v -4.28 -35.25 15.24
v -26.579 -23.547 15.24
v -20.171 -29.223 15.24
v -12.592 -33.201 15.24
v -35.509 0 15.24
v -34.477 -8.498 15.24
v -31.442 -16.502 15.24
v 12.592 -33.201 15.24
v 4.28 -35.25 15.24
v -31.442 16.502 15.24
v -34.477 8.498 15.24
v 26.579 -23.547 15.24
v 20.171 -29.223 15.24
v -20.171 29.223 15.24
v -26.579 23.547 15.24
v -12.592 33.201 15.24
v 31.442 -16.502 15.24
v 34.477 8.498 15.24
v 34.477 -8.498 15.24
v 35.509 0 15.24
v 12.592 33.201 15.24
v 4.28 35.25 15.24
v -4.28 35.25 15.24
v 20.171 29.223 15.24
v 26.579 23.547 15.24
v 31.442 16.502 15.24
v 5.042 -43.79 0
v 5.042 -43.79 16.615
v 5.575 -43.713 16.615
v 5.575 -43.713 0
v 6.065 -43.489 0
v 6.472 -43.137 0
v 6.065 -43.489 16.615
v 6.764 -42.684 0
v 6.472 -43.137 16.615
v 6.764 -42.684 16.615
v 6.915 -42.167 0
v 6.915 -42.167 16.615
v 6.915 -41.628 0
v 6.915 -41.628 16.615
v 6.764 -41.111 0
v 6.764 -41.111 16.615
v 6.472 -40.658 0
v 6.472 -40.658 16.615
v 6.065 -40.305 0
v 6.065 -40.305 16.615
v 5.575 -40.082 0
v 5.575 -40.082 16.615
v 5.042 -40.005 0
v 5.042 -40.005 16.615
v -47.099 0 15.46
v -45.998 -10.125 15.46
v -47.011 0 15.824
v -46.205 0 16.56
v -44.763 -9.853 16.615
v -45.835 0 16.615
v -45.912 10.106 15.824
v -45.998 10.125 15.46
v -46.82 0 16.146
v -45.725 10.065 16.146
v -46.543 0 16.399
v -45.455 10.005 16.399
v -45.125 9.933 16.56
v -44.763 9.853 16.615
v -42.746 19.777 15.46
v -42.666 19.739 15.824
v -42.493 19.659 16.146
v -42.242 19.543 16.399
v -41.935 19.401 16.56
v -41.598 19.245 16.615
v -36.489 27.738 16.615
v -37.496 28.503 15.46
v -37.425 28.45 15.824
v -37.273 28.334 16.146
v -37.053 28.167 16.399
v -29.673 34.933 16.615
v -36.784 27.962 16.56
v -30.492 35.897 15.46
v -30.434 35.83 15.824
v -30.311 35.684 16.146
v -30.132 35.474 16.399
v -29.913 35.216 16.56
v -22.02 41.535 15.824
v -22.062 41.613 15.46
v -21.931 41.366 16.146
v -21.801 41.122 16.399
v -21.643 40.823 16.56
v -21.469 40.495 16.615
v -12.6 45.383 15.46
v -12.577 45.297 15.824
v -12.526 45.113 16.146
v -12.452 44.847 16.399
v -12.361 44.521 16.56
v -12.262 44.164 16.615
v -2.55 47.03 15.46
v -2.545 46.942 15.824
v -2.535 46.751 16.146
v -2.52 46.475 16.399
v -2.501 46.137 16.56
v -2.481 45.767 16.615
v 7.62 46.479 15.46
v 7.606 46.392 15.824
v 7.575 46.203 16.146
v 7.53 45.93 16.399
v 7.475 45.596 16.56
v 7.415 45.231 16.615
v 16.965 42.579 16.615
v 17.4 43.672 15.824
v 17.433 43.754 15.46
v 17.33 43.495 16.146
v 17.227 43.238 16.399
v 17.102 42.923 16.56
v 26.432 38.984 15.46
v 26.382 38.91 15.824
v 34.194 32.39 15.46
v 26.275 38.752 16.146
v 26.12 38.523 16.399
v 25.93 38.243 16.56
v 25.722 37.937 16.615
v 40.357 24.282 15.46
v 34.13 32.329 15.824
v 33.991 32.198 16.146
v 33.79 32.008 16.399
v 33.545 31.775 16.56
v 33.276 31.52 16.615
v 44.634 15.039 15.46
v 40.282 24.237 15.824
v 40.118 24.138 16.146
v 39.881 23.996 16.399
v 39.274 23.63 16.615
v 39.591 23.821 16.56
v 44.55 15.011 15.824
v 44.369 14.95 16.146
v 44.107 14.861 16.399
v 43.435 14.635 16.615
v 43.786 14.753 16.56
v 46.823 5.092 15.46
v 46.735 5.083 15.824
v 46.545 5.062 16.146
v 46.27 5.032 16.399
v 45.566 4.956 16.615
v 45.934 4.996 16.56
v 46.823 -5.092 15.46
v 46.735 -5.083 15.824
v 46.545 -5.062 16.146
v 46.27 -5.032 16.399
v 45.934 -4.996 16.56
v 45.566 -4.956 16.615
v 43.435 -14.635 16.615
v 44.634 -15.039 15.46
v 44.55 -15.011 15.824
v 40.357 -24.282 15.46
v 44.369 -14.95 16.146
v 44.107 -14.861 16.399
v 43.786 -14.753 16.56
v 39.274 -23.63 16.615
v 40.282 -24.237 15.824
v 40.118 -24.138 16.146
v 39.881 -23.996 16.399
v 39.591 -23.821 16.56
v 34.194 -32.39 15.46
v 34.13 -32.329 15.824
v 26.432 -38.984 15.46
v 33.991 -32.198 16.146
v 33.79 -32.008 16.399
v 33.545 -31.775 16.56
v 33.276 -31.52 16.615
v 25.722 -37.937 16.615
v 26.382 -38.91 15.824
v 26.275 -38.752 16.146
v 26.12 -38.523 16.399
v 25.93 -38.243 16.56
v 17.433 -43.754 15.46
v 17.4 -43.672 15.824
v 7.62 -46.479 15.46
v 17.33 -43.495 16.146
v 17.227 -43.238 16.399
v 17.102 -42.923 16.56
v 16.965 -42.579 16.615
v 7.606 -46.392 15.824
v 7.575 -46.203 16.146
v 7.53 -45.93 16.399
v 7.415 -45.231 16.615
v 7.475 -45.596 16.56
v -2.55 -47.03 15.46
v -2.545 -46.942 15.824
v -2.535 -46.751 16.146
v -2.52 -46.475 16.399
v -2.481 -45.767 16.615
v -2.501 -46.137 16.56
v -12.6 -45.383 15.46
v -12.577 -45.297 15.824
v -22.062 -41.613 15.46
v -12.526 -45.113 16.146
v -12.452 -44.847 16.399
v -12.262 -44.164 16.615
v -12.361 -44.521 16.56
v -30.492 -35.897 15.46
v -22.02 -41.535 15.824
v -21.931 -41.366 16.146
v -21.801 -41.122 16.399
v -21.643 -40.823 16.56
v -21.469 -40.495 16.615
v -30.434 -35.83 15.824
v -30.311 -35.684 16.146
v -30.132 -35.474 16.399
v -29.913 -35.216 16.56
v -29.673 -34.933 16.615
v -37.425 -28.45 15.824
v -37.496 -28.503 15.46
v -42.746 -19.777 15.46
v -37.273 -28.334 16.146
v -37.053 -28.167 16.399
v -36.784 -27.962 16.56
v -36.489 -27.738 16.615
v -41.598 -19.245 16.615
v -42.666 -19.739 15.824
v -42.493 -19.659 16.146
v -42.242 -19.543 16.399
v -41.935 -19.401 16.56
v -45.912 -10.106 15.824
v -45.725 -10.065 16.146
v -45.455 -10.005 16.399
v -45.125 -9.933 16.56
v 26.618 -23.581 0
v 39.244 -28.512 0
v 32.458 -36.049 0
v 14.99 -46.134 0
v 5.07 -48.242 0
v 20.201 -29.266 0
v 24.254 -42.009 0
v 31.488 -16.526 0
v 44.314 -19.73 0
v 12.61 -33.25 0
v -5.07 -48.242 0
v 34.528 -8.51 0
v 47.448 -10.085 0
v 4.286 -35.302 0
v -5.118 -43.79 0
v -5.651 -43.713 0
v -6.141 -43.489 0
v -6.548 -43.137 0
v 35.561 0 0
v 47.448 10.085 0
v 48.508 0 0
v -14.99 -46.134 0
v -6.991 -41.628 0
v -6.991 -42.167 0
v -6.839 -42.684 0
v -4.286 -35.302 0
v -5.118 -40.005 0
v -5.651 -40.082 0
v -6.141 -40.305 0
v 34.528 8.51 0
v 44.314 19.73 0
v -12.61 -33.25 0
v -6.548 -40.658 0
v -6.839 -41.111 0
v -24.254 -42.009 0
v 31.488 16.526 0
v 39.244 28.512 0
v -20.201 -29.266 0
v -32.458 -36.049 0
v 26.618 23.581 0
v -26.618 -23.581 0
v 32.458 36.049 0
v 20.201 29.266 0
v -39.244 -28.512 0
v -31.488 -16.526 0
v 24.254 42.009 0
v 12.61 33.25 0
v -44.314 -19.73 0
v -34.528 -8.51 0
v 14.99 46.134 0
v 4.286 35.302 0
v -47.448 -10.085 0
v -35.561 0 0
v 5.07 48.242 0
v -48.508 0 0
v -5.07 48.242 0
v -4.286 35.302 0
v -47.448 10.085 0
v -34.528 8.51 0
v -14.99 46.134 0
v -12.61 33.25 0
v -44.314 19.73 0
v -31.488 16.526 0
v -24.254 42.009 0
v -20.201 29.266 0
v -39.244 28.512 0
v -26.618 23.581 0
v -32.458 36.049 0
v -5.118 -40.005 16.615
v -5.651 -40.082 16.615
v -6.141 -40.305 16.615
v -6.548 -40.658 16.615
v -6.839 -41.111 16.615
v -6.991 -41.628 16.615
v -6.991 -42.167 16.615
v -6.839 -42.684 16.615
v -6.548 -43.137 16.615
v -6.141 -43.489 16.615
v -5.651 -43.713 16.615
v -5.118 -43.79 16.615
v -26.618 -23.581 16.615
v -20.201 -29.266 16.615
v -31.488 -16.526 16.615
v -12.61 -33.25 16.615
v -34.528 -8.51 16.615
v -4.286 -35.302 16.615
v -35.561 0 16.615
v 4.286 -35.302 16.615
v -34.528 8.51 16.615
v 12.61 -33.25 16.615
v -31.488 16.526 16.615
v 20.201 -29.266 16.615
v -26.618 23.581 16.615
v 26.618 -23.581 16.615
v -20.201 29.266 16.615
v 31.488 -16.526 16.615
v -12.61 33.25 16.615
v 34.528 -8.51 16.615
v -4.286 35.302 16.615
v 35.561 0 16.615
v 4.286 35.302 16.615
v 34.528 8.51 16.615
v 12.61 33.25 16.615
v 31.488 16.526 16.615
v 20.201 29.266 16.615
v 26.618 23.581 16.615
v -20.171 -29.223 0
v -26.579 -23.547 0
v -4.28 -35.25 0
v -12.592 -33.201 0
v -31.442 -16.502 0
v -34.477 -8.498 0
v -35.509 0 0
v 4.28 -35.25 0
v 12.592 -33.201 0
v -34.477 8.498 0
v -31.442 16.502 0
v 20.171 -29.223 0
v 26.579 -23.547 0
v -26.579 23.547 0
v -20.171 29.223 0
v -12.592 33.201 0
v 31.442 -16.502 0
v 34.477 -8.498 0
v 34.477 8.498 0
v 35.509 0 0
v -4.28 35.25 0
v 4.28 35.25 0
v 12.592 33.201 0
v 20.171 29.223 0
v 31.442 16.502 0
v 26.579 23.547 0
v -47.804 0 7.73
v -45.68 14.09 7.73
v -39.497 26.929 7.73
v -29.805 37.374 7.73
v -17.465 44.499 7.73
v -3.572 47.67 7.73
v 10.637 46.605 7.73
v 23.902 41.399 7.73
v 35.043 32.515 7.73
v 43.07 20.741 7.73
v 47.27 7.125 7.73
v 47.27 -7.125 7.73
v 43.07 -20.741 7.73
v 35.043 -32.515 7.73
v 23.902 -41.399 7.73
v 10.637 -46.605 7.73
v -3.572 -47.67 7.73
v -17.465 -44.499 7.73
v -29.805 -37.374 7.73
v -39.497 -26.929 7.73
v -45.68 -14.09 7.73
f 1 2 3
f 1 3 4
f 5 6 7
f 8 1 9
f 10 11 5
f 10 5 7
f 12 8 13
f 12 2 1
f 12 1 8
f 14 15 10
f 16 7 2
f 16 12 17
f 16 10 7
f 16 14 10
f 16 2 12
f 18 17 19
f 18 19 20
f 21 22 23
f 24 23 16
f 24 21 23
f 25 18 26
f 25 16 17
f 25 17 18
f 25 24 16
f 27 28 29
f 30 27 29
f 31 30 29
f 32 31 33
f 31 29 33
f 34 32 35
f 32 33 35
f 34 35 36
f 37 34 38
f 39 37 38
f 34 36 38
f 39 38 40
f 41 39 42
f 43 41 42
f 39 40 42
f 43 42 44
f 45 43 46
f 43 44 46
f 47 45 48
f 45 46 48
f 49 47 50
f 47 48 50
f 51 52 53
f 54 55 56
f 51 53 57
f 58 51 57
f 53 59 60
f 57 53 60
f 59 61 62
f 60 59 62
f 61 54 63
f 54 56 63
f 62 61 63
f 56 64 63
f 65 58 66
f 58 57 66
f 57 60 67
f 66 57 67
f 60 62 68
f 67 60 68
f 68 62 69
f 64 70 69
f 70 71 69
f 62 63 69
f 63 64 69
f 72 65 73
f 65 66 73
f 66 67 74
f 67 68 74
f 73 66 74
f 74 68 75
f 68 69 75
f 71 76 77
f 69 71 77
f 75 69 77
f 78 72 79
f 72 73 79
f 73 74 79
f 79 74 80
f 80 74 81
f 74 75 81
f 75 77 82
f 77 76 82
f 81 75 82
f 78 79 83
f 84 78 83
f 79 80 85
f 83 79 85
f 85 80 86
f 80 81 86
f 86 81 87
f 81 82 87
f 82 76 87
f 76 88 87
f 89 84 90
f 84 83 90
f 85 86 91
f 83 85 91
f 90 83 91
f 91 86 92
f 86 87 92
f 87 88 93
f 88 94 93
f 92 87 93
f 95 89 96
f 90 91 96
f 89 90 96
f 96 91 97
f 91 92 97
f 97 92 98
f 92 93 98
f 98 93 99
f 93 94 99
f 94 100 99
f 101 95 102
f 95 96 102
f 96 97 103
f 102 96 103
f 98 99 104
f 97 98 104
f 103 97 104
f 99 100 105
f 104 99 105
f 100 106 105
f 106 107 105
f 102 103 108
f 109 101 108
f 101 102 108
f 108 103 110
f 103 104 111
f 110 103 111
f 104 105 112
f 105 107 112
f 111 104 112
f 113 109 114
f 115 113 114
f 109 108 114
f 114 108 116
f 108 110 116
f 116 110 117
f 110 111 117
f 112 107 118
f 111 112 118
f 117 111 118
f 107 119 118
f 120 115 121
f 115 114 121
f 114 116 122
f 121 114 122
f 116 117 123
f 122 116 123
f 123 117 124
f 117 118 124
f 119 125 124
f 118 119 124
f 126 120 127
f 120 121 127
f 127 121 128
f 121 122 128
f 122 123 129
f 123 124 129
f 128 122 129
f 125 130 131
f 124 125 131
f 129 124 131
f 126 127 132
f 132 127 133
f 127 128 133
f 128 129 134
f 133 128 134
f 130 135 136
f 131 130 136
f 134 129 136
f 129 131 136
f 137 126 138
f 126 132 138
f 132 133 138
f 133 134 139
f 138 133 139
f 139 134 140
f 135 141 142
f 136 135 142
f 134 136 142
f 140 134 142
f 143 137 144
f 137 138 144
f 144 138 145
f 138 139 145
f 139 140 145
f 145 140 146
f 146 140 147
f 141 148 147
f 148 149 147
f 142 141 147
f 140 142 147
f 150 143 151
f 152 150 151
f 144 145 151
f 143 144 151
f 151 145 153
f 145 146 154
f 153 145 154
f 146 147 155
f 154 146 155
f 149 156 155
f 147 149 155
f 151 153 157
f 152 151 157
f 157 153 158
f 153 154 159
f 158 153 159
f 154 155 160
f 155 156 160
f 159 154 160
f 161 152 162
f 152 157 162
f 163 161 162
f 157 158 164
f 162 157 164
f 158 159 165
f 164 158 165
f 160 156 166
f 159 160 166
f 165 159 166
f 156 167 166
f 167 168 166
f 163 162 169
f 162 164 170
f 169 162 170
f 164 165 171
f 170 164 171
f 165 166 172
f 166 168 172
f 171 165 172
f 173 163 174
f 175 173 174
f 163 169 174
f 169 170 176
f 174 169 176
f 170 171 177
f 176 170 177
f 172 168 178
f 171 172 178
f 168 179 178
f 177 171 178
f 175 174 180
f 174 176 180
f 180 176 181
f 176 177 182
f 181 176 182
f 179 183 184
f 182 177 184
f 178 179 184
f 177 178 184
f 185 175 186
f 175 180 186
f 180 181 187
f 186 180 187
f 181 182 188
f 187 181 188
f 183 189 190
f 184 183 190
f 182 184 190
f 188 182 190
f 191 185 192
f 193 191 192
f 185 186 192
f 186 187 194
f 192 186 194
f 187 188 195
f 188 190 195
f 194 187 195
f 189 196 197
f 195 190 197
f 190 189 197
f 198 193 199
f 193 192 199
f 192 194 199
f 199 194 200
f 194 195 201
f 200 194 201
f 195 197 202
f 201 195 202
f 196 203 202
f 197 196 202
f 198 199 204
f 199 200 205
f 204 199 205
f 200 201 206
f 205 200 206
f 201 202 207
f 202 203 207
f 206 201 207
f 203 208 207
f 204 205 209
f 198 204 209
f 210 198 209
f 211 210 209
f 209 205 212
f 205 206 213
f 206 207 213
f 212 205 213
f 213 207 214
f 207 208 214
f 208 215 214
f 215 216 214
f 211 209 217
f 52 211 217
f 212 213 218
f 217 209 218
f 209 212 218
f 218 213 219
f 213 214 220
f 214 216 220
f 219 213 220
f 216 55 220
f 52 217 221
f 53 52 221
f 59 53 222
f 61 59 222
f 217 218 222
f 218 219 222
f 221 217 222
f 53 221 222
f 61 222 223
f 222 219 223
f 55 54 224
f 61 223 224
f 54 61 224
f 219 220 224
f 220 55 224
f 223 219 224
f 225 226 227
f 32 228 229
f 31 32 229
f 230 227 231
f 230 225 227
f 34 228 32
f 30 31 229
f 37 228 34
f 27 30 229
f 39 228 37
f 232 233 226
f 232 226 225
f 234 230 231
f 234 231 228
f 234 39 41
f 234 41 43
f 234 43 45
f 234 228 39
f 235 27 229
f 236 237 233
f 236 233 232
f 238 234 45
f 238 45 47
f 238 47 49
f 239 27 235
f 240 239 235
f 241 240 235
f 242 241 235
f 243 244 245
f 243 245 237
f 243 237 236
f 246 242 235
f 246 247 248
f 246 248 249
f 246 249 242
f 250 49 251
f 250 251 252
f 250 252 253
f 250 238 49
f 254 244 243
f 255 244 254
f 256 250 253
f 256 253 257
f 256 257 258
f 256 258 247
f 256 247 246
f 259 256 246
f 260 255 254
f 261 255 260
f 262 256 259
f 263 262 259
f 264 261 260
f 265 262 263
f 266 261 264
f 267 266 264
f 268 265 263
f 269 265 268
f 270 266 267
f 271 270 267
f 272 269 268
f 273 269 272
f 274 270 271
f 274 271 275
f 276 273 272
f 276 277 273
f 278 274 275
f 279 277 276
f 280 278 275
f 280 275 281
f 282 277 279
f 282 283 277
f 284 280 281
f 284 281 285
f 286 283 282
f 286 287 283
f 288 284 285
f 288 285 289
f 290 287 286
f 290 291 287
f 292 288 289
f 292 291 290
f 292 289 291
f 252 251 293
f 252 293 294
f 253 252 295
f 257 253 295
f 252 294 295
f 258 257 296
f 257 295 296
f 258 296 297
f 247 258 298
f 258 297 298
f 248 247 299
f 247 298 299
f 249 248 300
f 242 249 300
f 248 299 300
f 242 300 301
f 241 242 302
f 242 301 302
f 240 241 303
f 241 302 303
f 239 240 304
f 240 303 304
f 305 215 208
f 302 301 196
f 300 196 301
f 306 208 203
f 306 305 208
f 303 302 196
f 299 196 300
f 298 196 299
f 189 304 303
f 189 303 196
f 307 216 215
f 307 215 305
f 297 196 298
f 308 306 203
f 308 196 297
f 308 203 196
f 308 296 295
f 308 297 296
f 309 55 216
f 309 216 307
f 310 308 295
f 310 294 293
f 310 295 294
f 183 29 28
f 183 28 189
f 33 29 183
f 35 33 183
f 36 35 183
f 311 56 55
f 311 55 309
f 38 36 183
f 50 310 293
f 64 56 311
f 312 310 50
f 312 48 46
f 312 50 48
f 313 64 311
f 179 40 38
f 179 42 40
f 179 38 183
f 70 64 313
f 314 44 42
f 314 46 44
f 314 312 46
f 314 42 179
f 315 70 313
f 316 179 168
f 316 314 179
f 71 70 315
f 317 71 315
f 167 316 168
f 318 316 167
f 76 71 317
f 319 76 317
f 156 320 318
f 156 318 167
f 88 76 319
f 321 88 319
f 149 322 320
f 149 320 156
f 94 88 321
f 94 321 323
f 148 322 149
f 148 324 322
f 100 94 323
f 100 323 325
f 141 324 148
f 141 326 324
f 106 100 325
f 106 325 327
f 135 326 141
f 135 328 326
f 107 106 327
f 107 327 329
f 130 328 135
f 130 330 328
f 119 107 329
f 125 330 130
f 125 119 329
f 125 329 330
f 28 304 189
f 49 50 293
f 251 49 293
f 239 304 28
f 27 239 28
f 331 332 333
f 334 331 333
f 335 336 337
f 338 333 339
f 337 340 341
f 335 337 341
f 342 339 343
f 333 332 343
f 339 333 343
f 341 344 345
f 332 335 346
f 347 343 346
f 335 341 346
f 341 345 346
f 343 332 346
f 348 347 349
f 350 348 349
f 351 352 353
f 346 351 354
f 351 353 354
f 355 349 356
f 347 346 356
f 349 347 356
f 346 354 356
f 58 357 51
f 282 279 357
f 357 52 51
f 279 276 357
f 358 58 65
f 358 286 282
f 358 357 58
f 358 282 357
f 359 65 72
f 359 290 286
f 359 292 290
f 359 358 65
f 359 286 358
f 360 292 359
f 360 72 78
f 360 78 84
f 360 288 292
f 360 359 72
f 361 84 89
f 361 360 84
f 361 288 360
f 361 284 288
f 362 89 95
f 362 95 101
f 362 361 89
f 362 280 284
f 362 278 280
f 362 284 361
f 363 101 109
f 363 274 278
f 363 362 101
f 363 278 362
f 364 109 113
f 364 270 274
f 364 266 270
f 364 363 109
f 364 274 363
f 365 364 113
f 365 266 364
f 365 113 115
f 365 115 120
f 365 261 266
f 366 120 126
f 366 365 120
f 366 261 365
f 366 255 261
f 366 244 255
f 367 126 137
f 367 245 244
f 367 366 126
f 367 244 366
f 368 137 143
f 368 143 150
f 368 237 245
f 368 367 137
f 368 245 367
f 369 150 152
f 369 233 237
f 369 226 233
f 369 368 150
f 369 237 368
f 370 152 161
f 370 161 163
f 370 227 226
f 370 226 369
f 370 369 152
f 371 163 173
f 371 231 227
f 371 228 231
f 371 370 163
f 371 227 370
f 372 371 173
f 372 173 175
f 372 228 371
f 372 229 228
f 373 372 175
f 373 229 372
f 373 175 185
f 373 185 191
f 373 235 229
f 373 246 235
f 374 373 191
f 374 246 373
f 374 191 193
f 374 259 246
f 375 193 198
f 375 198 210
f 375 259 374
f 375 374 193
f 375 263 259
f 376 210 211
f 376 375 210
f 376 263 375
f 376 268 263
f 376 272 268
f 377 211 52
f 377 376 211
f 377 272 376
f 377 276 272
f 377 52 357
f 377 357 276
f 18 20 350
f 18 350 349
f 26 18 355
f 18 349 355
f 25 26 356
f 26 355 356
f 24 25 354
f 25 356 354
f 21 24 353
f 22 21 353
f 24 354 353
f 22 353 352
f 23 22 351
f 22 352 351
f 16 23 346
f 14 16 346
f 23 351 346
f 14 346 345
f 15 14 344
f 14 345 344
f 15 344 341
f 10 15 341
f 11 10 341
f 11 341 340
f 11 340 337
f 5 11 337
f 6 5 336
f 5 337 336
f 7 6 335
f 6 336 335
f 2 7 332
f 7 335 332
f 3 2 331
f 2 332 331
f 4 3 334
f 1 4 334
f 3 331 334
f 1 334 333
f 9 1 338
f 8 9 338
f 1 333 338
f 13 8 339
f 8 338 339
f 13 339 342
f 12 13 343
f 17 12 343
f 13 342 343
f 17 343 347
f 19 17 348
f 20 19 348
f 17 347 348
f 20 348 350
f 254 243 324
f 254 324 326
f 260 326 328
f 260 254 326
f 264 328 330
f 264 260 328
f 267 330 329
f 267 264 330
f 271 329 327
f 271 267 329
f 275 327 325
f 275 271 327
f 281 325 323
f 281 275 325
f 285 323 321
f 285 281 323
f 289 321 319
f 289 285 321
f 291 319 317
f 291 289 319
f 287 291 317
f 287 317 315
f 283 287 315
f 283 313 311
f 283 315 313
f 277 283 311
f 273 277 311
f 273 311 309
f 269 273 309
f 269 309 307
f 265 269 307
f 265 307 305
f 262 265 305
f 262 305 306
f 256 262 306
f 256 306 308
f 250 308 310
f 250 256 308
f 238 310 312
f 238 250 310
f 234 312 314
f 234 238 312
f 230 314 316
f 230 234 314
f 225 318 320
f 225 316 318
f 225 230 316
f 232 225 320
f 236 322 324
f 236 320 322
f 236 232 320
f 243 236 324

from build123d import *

# Parameters (mm, degrees)
F2_R     = 35.560914
F3_DEPTH = 20.32
F4_R     = 35.508994
F5_DEPTH = 15.24
F7_DEPTH = 73.914
F8_R     = 1.27


with BuildPart() as f1:
    # F0 (on Front) → F1 (revolve)
    with BuildSketch(Plane.XZ):
        Polygon((-48.508111, 0), (0, 0), (0, 16.615132), (-46.994206, 16.615132), align=None)
    revolve(axis=Axis((0, 0, 8.307566), (0, 0, -1)))

    # F2 (on Top) → F3 (cut)
    with BuildSketch(Plane.XY):
        Circle(F2_R)
    extrude(amount=F3_DEPTH, mode=Mode.SUBTRACT)

    # F6 (on Top) → F7 (cut, symmetric)
    with BuildSketch(Plane.XY):
        with BuildLine():
            ThreePointArc((-5.117848, -40.005002), (-7.01023, -41.897384), (-5.117848, -43.789767))
            Line((-5.117848, -43.789767), (5.042152, -43.789767))
            ThreePointArc((5.042152, -43.789767), (6.934534, -41.897384), (5.042152, -40.005002))
            Line((5.042152, -40.005002), (-5.117848, -40.005002))
        make_face()
    extrude(amount=F7_DEPTH, both=True, mode=Mode.SUBTRACT)

    # F8
    f8_edges = [f1.edges().sort_by_distance(p)[0] for p in [
        (46.994206, 0, 16.615132),
    ]]
    fillet(f8_edges, radius=F8_R)


with BuildPart() as f5:
    # F4 (on Top) → F5 (new body)
    with BuildSketch(Plane.XY):
        Circle(F4_R)
    extrude(amount=F5_DEPTH)


solid = Compound([f1.part, f5.part])
